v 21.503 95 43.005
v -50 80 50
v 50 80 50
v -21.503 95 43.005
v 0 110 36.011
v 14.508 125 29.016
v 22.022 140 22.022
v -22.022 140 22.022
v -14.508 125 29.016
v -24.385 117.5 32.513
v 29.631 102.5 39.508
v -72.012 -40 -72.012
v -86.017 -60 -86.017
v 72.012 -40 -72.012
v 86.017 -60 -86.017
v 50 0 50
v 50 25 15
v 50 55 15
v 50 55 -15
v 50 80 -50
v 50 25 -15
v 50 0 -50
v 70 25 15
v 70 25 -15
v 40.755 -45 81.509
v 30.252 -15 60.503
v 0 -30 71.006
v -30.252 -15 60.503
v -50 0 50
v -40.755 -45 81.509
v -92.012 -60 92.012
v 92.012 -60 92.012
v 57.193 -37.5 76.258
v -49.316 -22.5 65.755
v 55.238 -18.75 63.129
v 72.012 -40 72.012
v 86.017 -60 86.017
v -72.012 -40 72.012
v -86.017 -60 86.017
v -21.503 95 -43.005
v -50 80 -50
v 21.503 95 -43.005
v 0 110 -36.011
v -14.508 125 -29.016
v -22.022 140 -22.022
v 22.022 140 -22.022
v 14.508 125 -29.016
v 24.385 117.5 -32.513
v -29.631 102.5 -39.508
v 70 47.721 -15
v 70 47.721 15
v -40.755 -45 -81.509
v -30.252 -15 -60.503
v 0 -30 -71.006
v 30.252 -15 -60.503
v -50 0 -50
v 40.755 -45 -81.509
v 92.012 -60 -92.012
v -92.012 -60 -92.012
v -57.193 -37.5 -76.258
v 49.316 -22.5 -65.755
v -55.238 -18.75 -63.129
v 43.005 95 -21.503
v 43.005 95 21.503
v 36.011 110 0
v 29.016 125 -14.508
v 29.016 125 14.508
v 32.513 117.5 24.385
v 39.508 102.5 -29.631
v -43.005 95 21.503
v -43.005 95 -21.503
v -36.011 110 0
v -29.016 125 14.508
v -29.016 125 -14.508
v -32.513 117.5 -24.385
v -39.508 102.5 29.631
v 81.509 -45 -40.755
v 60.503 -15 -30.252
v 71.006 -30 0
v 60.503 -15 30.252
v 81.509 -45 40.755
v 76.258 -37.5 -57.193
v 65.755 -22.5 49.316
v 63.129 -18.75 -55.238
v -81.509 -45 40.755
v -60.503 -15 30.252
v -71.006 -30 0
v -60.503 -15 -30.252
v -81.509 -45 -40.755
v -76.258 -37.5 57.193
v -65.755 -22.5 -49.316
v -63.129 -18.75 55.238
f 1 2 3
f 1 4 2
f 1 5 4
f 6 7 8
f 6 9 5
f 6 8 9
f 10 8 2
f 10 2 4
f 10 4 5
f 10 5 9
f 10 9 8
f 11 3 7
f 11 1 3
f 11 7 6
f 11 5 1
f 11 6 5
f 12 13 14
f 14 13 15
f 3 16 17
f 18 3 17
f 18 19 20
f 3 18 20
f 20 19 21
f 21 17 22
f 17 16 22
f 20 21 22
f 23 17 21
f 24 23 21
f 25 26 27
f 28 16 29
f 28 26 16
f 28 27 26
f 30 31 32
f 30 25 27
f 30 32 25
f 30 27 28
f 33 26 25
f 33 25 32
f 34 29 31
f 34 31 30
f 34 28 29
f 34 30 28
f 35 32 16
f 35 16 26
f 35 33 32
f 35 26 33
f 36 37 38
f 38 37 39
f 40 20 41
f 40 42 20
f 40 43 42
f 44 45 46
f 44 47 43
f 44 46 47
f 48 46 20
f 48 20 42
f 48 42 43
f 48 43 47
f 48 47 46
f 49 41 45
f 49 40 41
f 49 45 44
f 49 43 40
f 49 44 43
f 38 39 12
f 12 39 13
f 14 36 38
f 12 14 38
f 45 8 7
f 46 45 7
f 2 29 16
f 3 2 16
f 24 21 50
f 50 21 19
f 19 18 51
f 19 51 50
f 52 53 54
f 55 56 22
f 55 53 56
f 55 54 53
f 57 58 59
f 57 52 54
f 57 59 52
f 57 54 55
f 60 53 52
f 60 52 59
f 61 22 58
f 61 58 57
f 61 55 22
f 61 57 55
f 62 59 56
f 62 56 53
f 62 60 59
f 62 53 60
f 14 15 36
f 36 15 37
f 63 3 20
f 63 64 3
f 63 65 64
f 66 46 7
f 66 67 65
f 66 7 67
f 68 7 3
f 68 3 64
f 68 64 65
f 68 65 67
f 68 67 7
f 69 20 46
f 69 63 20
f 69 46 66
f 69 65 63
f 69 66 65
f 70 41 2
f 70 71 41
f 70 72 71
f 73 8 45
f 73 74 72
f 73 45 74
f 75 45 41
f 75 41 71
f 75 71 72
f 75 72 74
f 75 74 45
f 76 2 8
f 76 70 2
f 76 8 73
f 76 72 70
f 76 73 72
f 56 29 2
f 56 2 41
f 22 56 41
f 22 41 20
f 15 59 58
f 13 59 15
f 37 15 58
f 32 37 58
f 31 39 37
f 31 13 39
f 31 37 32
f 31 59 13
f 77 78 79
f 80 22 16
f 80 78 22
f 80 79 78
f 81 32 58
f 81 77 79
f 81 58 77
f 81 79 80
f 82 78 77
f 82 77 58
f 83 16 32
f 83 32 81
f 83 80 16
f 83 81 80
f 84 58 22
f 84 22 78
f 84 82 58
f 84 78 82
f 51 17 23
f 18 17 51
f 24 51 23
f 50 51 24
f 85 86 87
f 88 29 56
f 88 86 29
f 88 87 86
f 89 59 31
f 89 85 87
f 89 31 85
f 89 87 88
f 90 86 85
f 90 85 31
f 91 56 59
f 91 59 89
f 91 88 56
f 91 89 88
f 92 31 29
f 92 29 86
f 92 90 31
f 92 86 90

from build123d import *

# Parameters (mm, degrees)
SKETCH1_W           = 100
SKETCH1_H           = 100
BOSS_EXTRUDE1_DEPTH = 80
SKETCH2_W           = 100
SKETCH2_H           = 100
BOSS_EXTRUDE2_DEPTH = 60
BOSS_EXTRUDE2_TAPER = 25
SKETCH3_W           = 100
SKETCH3_H           = 100
BOSS_EXTRUDE3_DEPTH = 60
BOSS_EXTRUDE3_TAPER = -35
SKETCH5_W           = 144.024904586
SKETCH5_H           = 144.024904586
CUT_EXTRUDE2_DEPTH  = 20
CUT_EXTRUDE2_TAPER  = -35
SKETCH6_W           = 30
SKETCH6_H           = 30
BOSS_EXTRUDE4_DEPTH = 20
DRAFT5_ANGLE        = 20


with BuildPart() as part:
    # Sketch1 → Boss-Extrude1 (new body)
    with BuildSketch(Plane(origin=(0, 0, 0), x_dir=(1, 0, 0), z_dir=(0, 1, 0))):
        Rectangle(SKETCH1_W, SKETCH1_H)
    extrude(amount=BOSS_EXTRUDE1_DEPTH)

    # Sketch2 → Boss-Extrude2 (add)
    with BuildSketch(Plane(origin=(0, 80, 0), x_dir=(1, 0, 0), z_dir=(0, 1, 0))):
        Rectangle(SKETCH2_W, SKETCH2_H)
    extrude(amount=BOSS_EXTRUDE2_DEPTH, taper=BOSS_EXTRUDE2_TAPER)

    # Sketch3 → Boss-Extrude3 (add)
    with BuildSketch(Plane.XZ):
        Rectangle(SKETCH3_W, SKETCH3_H)
    extrude(amount=BOSS_EXTRUDE3_DEPTH, taper=BOSS_EXTRUDE3_TAPER)

    # Sketch5 → Cut-Extrude2 (cut)
    with BuildSketch(Plane(origin=(0, -40, 0), x_dir=(-1, 0, 0), z_dir=(0, -1, 0))):
        Rectangle(SKETCH5_W, SKETCH5_H)
    extrude(amount=CUT_EXTRUDE2_DEPTH, taper=CUT_EXTRUDE2_TAPER, mode=Mode.SUBTRACT)

    # Sketch6 → Boss-Extrude4 (add)
    with BuildSketch(Plane(origin=(50, 0, 0), x_dir=(0, 0, -1), z_dir=(1, 0, 0))):
        with Locations((0, 40)):
            Rectangle(SKETCH6_W, SKETCH6_H)
    extrude(amount=BOSS_EXTRUDE4_DEPTH)

    # Draft5
    draft5_faces = [part.faces().sort_by_distance(p)[0] for p in [
        (60, 55, 0),
    ]]
    draft(draft5_faces, Plane(origin=(50, 80, 50), x_dir=(0, 0, 1), z_dir=(1, 0, 0)), DRAFT5_ANGLE)


solid = part.part
